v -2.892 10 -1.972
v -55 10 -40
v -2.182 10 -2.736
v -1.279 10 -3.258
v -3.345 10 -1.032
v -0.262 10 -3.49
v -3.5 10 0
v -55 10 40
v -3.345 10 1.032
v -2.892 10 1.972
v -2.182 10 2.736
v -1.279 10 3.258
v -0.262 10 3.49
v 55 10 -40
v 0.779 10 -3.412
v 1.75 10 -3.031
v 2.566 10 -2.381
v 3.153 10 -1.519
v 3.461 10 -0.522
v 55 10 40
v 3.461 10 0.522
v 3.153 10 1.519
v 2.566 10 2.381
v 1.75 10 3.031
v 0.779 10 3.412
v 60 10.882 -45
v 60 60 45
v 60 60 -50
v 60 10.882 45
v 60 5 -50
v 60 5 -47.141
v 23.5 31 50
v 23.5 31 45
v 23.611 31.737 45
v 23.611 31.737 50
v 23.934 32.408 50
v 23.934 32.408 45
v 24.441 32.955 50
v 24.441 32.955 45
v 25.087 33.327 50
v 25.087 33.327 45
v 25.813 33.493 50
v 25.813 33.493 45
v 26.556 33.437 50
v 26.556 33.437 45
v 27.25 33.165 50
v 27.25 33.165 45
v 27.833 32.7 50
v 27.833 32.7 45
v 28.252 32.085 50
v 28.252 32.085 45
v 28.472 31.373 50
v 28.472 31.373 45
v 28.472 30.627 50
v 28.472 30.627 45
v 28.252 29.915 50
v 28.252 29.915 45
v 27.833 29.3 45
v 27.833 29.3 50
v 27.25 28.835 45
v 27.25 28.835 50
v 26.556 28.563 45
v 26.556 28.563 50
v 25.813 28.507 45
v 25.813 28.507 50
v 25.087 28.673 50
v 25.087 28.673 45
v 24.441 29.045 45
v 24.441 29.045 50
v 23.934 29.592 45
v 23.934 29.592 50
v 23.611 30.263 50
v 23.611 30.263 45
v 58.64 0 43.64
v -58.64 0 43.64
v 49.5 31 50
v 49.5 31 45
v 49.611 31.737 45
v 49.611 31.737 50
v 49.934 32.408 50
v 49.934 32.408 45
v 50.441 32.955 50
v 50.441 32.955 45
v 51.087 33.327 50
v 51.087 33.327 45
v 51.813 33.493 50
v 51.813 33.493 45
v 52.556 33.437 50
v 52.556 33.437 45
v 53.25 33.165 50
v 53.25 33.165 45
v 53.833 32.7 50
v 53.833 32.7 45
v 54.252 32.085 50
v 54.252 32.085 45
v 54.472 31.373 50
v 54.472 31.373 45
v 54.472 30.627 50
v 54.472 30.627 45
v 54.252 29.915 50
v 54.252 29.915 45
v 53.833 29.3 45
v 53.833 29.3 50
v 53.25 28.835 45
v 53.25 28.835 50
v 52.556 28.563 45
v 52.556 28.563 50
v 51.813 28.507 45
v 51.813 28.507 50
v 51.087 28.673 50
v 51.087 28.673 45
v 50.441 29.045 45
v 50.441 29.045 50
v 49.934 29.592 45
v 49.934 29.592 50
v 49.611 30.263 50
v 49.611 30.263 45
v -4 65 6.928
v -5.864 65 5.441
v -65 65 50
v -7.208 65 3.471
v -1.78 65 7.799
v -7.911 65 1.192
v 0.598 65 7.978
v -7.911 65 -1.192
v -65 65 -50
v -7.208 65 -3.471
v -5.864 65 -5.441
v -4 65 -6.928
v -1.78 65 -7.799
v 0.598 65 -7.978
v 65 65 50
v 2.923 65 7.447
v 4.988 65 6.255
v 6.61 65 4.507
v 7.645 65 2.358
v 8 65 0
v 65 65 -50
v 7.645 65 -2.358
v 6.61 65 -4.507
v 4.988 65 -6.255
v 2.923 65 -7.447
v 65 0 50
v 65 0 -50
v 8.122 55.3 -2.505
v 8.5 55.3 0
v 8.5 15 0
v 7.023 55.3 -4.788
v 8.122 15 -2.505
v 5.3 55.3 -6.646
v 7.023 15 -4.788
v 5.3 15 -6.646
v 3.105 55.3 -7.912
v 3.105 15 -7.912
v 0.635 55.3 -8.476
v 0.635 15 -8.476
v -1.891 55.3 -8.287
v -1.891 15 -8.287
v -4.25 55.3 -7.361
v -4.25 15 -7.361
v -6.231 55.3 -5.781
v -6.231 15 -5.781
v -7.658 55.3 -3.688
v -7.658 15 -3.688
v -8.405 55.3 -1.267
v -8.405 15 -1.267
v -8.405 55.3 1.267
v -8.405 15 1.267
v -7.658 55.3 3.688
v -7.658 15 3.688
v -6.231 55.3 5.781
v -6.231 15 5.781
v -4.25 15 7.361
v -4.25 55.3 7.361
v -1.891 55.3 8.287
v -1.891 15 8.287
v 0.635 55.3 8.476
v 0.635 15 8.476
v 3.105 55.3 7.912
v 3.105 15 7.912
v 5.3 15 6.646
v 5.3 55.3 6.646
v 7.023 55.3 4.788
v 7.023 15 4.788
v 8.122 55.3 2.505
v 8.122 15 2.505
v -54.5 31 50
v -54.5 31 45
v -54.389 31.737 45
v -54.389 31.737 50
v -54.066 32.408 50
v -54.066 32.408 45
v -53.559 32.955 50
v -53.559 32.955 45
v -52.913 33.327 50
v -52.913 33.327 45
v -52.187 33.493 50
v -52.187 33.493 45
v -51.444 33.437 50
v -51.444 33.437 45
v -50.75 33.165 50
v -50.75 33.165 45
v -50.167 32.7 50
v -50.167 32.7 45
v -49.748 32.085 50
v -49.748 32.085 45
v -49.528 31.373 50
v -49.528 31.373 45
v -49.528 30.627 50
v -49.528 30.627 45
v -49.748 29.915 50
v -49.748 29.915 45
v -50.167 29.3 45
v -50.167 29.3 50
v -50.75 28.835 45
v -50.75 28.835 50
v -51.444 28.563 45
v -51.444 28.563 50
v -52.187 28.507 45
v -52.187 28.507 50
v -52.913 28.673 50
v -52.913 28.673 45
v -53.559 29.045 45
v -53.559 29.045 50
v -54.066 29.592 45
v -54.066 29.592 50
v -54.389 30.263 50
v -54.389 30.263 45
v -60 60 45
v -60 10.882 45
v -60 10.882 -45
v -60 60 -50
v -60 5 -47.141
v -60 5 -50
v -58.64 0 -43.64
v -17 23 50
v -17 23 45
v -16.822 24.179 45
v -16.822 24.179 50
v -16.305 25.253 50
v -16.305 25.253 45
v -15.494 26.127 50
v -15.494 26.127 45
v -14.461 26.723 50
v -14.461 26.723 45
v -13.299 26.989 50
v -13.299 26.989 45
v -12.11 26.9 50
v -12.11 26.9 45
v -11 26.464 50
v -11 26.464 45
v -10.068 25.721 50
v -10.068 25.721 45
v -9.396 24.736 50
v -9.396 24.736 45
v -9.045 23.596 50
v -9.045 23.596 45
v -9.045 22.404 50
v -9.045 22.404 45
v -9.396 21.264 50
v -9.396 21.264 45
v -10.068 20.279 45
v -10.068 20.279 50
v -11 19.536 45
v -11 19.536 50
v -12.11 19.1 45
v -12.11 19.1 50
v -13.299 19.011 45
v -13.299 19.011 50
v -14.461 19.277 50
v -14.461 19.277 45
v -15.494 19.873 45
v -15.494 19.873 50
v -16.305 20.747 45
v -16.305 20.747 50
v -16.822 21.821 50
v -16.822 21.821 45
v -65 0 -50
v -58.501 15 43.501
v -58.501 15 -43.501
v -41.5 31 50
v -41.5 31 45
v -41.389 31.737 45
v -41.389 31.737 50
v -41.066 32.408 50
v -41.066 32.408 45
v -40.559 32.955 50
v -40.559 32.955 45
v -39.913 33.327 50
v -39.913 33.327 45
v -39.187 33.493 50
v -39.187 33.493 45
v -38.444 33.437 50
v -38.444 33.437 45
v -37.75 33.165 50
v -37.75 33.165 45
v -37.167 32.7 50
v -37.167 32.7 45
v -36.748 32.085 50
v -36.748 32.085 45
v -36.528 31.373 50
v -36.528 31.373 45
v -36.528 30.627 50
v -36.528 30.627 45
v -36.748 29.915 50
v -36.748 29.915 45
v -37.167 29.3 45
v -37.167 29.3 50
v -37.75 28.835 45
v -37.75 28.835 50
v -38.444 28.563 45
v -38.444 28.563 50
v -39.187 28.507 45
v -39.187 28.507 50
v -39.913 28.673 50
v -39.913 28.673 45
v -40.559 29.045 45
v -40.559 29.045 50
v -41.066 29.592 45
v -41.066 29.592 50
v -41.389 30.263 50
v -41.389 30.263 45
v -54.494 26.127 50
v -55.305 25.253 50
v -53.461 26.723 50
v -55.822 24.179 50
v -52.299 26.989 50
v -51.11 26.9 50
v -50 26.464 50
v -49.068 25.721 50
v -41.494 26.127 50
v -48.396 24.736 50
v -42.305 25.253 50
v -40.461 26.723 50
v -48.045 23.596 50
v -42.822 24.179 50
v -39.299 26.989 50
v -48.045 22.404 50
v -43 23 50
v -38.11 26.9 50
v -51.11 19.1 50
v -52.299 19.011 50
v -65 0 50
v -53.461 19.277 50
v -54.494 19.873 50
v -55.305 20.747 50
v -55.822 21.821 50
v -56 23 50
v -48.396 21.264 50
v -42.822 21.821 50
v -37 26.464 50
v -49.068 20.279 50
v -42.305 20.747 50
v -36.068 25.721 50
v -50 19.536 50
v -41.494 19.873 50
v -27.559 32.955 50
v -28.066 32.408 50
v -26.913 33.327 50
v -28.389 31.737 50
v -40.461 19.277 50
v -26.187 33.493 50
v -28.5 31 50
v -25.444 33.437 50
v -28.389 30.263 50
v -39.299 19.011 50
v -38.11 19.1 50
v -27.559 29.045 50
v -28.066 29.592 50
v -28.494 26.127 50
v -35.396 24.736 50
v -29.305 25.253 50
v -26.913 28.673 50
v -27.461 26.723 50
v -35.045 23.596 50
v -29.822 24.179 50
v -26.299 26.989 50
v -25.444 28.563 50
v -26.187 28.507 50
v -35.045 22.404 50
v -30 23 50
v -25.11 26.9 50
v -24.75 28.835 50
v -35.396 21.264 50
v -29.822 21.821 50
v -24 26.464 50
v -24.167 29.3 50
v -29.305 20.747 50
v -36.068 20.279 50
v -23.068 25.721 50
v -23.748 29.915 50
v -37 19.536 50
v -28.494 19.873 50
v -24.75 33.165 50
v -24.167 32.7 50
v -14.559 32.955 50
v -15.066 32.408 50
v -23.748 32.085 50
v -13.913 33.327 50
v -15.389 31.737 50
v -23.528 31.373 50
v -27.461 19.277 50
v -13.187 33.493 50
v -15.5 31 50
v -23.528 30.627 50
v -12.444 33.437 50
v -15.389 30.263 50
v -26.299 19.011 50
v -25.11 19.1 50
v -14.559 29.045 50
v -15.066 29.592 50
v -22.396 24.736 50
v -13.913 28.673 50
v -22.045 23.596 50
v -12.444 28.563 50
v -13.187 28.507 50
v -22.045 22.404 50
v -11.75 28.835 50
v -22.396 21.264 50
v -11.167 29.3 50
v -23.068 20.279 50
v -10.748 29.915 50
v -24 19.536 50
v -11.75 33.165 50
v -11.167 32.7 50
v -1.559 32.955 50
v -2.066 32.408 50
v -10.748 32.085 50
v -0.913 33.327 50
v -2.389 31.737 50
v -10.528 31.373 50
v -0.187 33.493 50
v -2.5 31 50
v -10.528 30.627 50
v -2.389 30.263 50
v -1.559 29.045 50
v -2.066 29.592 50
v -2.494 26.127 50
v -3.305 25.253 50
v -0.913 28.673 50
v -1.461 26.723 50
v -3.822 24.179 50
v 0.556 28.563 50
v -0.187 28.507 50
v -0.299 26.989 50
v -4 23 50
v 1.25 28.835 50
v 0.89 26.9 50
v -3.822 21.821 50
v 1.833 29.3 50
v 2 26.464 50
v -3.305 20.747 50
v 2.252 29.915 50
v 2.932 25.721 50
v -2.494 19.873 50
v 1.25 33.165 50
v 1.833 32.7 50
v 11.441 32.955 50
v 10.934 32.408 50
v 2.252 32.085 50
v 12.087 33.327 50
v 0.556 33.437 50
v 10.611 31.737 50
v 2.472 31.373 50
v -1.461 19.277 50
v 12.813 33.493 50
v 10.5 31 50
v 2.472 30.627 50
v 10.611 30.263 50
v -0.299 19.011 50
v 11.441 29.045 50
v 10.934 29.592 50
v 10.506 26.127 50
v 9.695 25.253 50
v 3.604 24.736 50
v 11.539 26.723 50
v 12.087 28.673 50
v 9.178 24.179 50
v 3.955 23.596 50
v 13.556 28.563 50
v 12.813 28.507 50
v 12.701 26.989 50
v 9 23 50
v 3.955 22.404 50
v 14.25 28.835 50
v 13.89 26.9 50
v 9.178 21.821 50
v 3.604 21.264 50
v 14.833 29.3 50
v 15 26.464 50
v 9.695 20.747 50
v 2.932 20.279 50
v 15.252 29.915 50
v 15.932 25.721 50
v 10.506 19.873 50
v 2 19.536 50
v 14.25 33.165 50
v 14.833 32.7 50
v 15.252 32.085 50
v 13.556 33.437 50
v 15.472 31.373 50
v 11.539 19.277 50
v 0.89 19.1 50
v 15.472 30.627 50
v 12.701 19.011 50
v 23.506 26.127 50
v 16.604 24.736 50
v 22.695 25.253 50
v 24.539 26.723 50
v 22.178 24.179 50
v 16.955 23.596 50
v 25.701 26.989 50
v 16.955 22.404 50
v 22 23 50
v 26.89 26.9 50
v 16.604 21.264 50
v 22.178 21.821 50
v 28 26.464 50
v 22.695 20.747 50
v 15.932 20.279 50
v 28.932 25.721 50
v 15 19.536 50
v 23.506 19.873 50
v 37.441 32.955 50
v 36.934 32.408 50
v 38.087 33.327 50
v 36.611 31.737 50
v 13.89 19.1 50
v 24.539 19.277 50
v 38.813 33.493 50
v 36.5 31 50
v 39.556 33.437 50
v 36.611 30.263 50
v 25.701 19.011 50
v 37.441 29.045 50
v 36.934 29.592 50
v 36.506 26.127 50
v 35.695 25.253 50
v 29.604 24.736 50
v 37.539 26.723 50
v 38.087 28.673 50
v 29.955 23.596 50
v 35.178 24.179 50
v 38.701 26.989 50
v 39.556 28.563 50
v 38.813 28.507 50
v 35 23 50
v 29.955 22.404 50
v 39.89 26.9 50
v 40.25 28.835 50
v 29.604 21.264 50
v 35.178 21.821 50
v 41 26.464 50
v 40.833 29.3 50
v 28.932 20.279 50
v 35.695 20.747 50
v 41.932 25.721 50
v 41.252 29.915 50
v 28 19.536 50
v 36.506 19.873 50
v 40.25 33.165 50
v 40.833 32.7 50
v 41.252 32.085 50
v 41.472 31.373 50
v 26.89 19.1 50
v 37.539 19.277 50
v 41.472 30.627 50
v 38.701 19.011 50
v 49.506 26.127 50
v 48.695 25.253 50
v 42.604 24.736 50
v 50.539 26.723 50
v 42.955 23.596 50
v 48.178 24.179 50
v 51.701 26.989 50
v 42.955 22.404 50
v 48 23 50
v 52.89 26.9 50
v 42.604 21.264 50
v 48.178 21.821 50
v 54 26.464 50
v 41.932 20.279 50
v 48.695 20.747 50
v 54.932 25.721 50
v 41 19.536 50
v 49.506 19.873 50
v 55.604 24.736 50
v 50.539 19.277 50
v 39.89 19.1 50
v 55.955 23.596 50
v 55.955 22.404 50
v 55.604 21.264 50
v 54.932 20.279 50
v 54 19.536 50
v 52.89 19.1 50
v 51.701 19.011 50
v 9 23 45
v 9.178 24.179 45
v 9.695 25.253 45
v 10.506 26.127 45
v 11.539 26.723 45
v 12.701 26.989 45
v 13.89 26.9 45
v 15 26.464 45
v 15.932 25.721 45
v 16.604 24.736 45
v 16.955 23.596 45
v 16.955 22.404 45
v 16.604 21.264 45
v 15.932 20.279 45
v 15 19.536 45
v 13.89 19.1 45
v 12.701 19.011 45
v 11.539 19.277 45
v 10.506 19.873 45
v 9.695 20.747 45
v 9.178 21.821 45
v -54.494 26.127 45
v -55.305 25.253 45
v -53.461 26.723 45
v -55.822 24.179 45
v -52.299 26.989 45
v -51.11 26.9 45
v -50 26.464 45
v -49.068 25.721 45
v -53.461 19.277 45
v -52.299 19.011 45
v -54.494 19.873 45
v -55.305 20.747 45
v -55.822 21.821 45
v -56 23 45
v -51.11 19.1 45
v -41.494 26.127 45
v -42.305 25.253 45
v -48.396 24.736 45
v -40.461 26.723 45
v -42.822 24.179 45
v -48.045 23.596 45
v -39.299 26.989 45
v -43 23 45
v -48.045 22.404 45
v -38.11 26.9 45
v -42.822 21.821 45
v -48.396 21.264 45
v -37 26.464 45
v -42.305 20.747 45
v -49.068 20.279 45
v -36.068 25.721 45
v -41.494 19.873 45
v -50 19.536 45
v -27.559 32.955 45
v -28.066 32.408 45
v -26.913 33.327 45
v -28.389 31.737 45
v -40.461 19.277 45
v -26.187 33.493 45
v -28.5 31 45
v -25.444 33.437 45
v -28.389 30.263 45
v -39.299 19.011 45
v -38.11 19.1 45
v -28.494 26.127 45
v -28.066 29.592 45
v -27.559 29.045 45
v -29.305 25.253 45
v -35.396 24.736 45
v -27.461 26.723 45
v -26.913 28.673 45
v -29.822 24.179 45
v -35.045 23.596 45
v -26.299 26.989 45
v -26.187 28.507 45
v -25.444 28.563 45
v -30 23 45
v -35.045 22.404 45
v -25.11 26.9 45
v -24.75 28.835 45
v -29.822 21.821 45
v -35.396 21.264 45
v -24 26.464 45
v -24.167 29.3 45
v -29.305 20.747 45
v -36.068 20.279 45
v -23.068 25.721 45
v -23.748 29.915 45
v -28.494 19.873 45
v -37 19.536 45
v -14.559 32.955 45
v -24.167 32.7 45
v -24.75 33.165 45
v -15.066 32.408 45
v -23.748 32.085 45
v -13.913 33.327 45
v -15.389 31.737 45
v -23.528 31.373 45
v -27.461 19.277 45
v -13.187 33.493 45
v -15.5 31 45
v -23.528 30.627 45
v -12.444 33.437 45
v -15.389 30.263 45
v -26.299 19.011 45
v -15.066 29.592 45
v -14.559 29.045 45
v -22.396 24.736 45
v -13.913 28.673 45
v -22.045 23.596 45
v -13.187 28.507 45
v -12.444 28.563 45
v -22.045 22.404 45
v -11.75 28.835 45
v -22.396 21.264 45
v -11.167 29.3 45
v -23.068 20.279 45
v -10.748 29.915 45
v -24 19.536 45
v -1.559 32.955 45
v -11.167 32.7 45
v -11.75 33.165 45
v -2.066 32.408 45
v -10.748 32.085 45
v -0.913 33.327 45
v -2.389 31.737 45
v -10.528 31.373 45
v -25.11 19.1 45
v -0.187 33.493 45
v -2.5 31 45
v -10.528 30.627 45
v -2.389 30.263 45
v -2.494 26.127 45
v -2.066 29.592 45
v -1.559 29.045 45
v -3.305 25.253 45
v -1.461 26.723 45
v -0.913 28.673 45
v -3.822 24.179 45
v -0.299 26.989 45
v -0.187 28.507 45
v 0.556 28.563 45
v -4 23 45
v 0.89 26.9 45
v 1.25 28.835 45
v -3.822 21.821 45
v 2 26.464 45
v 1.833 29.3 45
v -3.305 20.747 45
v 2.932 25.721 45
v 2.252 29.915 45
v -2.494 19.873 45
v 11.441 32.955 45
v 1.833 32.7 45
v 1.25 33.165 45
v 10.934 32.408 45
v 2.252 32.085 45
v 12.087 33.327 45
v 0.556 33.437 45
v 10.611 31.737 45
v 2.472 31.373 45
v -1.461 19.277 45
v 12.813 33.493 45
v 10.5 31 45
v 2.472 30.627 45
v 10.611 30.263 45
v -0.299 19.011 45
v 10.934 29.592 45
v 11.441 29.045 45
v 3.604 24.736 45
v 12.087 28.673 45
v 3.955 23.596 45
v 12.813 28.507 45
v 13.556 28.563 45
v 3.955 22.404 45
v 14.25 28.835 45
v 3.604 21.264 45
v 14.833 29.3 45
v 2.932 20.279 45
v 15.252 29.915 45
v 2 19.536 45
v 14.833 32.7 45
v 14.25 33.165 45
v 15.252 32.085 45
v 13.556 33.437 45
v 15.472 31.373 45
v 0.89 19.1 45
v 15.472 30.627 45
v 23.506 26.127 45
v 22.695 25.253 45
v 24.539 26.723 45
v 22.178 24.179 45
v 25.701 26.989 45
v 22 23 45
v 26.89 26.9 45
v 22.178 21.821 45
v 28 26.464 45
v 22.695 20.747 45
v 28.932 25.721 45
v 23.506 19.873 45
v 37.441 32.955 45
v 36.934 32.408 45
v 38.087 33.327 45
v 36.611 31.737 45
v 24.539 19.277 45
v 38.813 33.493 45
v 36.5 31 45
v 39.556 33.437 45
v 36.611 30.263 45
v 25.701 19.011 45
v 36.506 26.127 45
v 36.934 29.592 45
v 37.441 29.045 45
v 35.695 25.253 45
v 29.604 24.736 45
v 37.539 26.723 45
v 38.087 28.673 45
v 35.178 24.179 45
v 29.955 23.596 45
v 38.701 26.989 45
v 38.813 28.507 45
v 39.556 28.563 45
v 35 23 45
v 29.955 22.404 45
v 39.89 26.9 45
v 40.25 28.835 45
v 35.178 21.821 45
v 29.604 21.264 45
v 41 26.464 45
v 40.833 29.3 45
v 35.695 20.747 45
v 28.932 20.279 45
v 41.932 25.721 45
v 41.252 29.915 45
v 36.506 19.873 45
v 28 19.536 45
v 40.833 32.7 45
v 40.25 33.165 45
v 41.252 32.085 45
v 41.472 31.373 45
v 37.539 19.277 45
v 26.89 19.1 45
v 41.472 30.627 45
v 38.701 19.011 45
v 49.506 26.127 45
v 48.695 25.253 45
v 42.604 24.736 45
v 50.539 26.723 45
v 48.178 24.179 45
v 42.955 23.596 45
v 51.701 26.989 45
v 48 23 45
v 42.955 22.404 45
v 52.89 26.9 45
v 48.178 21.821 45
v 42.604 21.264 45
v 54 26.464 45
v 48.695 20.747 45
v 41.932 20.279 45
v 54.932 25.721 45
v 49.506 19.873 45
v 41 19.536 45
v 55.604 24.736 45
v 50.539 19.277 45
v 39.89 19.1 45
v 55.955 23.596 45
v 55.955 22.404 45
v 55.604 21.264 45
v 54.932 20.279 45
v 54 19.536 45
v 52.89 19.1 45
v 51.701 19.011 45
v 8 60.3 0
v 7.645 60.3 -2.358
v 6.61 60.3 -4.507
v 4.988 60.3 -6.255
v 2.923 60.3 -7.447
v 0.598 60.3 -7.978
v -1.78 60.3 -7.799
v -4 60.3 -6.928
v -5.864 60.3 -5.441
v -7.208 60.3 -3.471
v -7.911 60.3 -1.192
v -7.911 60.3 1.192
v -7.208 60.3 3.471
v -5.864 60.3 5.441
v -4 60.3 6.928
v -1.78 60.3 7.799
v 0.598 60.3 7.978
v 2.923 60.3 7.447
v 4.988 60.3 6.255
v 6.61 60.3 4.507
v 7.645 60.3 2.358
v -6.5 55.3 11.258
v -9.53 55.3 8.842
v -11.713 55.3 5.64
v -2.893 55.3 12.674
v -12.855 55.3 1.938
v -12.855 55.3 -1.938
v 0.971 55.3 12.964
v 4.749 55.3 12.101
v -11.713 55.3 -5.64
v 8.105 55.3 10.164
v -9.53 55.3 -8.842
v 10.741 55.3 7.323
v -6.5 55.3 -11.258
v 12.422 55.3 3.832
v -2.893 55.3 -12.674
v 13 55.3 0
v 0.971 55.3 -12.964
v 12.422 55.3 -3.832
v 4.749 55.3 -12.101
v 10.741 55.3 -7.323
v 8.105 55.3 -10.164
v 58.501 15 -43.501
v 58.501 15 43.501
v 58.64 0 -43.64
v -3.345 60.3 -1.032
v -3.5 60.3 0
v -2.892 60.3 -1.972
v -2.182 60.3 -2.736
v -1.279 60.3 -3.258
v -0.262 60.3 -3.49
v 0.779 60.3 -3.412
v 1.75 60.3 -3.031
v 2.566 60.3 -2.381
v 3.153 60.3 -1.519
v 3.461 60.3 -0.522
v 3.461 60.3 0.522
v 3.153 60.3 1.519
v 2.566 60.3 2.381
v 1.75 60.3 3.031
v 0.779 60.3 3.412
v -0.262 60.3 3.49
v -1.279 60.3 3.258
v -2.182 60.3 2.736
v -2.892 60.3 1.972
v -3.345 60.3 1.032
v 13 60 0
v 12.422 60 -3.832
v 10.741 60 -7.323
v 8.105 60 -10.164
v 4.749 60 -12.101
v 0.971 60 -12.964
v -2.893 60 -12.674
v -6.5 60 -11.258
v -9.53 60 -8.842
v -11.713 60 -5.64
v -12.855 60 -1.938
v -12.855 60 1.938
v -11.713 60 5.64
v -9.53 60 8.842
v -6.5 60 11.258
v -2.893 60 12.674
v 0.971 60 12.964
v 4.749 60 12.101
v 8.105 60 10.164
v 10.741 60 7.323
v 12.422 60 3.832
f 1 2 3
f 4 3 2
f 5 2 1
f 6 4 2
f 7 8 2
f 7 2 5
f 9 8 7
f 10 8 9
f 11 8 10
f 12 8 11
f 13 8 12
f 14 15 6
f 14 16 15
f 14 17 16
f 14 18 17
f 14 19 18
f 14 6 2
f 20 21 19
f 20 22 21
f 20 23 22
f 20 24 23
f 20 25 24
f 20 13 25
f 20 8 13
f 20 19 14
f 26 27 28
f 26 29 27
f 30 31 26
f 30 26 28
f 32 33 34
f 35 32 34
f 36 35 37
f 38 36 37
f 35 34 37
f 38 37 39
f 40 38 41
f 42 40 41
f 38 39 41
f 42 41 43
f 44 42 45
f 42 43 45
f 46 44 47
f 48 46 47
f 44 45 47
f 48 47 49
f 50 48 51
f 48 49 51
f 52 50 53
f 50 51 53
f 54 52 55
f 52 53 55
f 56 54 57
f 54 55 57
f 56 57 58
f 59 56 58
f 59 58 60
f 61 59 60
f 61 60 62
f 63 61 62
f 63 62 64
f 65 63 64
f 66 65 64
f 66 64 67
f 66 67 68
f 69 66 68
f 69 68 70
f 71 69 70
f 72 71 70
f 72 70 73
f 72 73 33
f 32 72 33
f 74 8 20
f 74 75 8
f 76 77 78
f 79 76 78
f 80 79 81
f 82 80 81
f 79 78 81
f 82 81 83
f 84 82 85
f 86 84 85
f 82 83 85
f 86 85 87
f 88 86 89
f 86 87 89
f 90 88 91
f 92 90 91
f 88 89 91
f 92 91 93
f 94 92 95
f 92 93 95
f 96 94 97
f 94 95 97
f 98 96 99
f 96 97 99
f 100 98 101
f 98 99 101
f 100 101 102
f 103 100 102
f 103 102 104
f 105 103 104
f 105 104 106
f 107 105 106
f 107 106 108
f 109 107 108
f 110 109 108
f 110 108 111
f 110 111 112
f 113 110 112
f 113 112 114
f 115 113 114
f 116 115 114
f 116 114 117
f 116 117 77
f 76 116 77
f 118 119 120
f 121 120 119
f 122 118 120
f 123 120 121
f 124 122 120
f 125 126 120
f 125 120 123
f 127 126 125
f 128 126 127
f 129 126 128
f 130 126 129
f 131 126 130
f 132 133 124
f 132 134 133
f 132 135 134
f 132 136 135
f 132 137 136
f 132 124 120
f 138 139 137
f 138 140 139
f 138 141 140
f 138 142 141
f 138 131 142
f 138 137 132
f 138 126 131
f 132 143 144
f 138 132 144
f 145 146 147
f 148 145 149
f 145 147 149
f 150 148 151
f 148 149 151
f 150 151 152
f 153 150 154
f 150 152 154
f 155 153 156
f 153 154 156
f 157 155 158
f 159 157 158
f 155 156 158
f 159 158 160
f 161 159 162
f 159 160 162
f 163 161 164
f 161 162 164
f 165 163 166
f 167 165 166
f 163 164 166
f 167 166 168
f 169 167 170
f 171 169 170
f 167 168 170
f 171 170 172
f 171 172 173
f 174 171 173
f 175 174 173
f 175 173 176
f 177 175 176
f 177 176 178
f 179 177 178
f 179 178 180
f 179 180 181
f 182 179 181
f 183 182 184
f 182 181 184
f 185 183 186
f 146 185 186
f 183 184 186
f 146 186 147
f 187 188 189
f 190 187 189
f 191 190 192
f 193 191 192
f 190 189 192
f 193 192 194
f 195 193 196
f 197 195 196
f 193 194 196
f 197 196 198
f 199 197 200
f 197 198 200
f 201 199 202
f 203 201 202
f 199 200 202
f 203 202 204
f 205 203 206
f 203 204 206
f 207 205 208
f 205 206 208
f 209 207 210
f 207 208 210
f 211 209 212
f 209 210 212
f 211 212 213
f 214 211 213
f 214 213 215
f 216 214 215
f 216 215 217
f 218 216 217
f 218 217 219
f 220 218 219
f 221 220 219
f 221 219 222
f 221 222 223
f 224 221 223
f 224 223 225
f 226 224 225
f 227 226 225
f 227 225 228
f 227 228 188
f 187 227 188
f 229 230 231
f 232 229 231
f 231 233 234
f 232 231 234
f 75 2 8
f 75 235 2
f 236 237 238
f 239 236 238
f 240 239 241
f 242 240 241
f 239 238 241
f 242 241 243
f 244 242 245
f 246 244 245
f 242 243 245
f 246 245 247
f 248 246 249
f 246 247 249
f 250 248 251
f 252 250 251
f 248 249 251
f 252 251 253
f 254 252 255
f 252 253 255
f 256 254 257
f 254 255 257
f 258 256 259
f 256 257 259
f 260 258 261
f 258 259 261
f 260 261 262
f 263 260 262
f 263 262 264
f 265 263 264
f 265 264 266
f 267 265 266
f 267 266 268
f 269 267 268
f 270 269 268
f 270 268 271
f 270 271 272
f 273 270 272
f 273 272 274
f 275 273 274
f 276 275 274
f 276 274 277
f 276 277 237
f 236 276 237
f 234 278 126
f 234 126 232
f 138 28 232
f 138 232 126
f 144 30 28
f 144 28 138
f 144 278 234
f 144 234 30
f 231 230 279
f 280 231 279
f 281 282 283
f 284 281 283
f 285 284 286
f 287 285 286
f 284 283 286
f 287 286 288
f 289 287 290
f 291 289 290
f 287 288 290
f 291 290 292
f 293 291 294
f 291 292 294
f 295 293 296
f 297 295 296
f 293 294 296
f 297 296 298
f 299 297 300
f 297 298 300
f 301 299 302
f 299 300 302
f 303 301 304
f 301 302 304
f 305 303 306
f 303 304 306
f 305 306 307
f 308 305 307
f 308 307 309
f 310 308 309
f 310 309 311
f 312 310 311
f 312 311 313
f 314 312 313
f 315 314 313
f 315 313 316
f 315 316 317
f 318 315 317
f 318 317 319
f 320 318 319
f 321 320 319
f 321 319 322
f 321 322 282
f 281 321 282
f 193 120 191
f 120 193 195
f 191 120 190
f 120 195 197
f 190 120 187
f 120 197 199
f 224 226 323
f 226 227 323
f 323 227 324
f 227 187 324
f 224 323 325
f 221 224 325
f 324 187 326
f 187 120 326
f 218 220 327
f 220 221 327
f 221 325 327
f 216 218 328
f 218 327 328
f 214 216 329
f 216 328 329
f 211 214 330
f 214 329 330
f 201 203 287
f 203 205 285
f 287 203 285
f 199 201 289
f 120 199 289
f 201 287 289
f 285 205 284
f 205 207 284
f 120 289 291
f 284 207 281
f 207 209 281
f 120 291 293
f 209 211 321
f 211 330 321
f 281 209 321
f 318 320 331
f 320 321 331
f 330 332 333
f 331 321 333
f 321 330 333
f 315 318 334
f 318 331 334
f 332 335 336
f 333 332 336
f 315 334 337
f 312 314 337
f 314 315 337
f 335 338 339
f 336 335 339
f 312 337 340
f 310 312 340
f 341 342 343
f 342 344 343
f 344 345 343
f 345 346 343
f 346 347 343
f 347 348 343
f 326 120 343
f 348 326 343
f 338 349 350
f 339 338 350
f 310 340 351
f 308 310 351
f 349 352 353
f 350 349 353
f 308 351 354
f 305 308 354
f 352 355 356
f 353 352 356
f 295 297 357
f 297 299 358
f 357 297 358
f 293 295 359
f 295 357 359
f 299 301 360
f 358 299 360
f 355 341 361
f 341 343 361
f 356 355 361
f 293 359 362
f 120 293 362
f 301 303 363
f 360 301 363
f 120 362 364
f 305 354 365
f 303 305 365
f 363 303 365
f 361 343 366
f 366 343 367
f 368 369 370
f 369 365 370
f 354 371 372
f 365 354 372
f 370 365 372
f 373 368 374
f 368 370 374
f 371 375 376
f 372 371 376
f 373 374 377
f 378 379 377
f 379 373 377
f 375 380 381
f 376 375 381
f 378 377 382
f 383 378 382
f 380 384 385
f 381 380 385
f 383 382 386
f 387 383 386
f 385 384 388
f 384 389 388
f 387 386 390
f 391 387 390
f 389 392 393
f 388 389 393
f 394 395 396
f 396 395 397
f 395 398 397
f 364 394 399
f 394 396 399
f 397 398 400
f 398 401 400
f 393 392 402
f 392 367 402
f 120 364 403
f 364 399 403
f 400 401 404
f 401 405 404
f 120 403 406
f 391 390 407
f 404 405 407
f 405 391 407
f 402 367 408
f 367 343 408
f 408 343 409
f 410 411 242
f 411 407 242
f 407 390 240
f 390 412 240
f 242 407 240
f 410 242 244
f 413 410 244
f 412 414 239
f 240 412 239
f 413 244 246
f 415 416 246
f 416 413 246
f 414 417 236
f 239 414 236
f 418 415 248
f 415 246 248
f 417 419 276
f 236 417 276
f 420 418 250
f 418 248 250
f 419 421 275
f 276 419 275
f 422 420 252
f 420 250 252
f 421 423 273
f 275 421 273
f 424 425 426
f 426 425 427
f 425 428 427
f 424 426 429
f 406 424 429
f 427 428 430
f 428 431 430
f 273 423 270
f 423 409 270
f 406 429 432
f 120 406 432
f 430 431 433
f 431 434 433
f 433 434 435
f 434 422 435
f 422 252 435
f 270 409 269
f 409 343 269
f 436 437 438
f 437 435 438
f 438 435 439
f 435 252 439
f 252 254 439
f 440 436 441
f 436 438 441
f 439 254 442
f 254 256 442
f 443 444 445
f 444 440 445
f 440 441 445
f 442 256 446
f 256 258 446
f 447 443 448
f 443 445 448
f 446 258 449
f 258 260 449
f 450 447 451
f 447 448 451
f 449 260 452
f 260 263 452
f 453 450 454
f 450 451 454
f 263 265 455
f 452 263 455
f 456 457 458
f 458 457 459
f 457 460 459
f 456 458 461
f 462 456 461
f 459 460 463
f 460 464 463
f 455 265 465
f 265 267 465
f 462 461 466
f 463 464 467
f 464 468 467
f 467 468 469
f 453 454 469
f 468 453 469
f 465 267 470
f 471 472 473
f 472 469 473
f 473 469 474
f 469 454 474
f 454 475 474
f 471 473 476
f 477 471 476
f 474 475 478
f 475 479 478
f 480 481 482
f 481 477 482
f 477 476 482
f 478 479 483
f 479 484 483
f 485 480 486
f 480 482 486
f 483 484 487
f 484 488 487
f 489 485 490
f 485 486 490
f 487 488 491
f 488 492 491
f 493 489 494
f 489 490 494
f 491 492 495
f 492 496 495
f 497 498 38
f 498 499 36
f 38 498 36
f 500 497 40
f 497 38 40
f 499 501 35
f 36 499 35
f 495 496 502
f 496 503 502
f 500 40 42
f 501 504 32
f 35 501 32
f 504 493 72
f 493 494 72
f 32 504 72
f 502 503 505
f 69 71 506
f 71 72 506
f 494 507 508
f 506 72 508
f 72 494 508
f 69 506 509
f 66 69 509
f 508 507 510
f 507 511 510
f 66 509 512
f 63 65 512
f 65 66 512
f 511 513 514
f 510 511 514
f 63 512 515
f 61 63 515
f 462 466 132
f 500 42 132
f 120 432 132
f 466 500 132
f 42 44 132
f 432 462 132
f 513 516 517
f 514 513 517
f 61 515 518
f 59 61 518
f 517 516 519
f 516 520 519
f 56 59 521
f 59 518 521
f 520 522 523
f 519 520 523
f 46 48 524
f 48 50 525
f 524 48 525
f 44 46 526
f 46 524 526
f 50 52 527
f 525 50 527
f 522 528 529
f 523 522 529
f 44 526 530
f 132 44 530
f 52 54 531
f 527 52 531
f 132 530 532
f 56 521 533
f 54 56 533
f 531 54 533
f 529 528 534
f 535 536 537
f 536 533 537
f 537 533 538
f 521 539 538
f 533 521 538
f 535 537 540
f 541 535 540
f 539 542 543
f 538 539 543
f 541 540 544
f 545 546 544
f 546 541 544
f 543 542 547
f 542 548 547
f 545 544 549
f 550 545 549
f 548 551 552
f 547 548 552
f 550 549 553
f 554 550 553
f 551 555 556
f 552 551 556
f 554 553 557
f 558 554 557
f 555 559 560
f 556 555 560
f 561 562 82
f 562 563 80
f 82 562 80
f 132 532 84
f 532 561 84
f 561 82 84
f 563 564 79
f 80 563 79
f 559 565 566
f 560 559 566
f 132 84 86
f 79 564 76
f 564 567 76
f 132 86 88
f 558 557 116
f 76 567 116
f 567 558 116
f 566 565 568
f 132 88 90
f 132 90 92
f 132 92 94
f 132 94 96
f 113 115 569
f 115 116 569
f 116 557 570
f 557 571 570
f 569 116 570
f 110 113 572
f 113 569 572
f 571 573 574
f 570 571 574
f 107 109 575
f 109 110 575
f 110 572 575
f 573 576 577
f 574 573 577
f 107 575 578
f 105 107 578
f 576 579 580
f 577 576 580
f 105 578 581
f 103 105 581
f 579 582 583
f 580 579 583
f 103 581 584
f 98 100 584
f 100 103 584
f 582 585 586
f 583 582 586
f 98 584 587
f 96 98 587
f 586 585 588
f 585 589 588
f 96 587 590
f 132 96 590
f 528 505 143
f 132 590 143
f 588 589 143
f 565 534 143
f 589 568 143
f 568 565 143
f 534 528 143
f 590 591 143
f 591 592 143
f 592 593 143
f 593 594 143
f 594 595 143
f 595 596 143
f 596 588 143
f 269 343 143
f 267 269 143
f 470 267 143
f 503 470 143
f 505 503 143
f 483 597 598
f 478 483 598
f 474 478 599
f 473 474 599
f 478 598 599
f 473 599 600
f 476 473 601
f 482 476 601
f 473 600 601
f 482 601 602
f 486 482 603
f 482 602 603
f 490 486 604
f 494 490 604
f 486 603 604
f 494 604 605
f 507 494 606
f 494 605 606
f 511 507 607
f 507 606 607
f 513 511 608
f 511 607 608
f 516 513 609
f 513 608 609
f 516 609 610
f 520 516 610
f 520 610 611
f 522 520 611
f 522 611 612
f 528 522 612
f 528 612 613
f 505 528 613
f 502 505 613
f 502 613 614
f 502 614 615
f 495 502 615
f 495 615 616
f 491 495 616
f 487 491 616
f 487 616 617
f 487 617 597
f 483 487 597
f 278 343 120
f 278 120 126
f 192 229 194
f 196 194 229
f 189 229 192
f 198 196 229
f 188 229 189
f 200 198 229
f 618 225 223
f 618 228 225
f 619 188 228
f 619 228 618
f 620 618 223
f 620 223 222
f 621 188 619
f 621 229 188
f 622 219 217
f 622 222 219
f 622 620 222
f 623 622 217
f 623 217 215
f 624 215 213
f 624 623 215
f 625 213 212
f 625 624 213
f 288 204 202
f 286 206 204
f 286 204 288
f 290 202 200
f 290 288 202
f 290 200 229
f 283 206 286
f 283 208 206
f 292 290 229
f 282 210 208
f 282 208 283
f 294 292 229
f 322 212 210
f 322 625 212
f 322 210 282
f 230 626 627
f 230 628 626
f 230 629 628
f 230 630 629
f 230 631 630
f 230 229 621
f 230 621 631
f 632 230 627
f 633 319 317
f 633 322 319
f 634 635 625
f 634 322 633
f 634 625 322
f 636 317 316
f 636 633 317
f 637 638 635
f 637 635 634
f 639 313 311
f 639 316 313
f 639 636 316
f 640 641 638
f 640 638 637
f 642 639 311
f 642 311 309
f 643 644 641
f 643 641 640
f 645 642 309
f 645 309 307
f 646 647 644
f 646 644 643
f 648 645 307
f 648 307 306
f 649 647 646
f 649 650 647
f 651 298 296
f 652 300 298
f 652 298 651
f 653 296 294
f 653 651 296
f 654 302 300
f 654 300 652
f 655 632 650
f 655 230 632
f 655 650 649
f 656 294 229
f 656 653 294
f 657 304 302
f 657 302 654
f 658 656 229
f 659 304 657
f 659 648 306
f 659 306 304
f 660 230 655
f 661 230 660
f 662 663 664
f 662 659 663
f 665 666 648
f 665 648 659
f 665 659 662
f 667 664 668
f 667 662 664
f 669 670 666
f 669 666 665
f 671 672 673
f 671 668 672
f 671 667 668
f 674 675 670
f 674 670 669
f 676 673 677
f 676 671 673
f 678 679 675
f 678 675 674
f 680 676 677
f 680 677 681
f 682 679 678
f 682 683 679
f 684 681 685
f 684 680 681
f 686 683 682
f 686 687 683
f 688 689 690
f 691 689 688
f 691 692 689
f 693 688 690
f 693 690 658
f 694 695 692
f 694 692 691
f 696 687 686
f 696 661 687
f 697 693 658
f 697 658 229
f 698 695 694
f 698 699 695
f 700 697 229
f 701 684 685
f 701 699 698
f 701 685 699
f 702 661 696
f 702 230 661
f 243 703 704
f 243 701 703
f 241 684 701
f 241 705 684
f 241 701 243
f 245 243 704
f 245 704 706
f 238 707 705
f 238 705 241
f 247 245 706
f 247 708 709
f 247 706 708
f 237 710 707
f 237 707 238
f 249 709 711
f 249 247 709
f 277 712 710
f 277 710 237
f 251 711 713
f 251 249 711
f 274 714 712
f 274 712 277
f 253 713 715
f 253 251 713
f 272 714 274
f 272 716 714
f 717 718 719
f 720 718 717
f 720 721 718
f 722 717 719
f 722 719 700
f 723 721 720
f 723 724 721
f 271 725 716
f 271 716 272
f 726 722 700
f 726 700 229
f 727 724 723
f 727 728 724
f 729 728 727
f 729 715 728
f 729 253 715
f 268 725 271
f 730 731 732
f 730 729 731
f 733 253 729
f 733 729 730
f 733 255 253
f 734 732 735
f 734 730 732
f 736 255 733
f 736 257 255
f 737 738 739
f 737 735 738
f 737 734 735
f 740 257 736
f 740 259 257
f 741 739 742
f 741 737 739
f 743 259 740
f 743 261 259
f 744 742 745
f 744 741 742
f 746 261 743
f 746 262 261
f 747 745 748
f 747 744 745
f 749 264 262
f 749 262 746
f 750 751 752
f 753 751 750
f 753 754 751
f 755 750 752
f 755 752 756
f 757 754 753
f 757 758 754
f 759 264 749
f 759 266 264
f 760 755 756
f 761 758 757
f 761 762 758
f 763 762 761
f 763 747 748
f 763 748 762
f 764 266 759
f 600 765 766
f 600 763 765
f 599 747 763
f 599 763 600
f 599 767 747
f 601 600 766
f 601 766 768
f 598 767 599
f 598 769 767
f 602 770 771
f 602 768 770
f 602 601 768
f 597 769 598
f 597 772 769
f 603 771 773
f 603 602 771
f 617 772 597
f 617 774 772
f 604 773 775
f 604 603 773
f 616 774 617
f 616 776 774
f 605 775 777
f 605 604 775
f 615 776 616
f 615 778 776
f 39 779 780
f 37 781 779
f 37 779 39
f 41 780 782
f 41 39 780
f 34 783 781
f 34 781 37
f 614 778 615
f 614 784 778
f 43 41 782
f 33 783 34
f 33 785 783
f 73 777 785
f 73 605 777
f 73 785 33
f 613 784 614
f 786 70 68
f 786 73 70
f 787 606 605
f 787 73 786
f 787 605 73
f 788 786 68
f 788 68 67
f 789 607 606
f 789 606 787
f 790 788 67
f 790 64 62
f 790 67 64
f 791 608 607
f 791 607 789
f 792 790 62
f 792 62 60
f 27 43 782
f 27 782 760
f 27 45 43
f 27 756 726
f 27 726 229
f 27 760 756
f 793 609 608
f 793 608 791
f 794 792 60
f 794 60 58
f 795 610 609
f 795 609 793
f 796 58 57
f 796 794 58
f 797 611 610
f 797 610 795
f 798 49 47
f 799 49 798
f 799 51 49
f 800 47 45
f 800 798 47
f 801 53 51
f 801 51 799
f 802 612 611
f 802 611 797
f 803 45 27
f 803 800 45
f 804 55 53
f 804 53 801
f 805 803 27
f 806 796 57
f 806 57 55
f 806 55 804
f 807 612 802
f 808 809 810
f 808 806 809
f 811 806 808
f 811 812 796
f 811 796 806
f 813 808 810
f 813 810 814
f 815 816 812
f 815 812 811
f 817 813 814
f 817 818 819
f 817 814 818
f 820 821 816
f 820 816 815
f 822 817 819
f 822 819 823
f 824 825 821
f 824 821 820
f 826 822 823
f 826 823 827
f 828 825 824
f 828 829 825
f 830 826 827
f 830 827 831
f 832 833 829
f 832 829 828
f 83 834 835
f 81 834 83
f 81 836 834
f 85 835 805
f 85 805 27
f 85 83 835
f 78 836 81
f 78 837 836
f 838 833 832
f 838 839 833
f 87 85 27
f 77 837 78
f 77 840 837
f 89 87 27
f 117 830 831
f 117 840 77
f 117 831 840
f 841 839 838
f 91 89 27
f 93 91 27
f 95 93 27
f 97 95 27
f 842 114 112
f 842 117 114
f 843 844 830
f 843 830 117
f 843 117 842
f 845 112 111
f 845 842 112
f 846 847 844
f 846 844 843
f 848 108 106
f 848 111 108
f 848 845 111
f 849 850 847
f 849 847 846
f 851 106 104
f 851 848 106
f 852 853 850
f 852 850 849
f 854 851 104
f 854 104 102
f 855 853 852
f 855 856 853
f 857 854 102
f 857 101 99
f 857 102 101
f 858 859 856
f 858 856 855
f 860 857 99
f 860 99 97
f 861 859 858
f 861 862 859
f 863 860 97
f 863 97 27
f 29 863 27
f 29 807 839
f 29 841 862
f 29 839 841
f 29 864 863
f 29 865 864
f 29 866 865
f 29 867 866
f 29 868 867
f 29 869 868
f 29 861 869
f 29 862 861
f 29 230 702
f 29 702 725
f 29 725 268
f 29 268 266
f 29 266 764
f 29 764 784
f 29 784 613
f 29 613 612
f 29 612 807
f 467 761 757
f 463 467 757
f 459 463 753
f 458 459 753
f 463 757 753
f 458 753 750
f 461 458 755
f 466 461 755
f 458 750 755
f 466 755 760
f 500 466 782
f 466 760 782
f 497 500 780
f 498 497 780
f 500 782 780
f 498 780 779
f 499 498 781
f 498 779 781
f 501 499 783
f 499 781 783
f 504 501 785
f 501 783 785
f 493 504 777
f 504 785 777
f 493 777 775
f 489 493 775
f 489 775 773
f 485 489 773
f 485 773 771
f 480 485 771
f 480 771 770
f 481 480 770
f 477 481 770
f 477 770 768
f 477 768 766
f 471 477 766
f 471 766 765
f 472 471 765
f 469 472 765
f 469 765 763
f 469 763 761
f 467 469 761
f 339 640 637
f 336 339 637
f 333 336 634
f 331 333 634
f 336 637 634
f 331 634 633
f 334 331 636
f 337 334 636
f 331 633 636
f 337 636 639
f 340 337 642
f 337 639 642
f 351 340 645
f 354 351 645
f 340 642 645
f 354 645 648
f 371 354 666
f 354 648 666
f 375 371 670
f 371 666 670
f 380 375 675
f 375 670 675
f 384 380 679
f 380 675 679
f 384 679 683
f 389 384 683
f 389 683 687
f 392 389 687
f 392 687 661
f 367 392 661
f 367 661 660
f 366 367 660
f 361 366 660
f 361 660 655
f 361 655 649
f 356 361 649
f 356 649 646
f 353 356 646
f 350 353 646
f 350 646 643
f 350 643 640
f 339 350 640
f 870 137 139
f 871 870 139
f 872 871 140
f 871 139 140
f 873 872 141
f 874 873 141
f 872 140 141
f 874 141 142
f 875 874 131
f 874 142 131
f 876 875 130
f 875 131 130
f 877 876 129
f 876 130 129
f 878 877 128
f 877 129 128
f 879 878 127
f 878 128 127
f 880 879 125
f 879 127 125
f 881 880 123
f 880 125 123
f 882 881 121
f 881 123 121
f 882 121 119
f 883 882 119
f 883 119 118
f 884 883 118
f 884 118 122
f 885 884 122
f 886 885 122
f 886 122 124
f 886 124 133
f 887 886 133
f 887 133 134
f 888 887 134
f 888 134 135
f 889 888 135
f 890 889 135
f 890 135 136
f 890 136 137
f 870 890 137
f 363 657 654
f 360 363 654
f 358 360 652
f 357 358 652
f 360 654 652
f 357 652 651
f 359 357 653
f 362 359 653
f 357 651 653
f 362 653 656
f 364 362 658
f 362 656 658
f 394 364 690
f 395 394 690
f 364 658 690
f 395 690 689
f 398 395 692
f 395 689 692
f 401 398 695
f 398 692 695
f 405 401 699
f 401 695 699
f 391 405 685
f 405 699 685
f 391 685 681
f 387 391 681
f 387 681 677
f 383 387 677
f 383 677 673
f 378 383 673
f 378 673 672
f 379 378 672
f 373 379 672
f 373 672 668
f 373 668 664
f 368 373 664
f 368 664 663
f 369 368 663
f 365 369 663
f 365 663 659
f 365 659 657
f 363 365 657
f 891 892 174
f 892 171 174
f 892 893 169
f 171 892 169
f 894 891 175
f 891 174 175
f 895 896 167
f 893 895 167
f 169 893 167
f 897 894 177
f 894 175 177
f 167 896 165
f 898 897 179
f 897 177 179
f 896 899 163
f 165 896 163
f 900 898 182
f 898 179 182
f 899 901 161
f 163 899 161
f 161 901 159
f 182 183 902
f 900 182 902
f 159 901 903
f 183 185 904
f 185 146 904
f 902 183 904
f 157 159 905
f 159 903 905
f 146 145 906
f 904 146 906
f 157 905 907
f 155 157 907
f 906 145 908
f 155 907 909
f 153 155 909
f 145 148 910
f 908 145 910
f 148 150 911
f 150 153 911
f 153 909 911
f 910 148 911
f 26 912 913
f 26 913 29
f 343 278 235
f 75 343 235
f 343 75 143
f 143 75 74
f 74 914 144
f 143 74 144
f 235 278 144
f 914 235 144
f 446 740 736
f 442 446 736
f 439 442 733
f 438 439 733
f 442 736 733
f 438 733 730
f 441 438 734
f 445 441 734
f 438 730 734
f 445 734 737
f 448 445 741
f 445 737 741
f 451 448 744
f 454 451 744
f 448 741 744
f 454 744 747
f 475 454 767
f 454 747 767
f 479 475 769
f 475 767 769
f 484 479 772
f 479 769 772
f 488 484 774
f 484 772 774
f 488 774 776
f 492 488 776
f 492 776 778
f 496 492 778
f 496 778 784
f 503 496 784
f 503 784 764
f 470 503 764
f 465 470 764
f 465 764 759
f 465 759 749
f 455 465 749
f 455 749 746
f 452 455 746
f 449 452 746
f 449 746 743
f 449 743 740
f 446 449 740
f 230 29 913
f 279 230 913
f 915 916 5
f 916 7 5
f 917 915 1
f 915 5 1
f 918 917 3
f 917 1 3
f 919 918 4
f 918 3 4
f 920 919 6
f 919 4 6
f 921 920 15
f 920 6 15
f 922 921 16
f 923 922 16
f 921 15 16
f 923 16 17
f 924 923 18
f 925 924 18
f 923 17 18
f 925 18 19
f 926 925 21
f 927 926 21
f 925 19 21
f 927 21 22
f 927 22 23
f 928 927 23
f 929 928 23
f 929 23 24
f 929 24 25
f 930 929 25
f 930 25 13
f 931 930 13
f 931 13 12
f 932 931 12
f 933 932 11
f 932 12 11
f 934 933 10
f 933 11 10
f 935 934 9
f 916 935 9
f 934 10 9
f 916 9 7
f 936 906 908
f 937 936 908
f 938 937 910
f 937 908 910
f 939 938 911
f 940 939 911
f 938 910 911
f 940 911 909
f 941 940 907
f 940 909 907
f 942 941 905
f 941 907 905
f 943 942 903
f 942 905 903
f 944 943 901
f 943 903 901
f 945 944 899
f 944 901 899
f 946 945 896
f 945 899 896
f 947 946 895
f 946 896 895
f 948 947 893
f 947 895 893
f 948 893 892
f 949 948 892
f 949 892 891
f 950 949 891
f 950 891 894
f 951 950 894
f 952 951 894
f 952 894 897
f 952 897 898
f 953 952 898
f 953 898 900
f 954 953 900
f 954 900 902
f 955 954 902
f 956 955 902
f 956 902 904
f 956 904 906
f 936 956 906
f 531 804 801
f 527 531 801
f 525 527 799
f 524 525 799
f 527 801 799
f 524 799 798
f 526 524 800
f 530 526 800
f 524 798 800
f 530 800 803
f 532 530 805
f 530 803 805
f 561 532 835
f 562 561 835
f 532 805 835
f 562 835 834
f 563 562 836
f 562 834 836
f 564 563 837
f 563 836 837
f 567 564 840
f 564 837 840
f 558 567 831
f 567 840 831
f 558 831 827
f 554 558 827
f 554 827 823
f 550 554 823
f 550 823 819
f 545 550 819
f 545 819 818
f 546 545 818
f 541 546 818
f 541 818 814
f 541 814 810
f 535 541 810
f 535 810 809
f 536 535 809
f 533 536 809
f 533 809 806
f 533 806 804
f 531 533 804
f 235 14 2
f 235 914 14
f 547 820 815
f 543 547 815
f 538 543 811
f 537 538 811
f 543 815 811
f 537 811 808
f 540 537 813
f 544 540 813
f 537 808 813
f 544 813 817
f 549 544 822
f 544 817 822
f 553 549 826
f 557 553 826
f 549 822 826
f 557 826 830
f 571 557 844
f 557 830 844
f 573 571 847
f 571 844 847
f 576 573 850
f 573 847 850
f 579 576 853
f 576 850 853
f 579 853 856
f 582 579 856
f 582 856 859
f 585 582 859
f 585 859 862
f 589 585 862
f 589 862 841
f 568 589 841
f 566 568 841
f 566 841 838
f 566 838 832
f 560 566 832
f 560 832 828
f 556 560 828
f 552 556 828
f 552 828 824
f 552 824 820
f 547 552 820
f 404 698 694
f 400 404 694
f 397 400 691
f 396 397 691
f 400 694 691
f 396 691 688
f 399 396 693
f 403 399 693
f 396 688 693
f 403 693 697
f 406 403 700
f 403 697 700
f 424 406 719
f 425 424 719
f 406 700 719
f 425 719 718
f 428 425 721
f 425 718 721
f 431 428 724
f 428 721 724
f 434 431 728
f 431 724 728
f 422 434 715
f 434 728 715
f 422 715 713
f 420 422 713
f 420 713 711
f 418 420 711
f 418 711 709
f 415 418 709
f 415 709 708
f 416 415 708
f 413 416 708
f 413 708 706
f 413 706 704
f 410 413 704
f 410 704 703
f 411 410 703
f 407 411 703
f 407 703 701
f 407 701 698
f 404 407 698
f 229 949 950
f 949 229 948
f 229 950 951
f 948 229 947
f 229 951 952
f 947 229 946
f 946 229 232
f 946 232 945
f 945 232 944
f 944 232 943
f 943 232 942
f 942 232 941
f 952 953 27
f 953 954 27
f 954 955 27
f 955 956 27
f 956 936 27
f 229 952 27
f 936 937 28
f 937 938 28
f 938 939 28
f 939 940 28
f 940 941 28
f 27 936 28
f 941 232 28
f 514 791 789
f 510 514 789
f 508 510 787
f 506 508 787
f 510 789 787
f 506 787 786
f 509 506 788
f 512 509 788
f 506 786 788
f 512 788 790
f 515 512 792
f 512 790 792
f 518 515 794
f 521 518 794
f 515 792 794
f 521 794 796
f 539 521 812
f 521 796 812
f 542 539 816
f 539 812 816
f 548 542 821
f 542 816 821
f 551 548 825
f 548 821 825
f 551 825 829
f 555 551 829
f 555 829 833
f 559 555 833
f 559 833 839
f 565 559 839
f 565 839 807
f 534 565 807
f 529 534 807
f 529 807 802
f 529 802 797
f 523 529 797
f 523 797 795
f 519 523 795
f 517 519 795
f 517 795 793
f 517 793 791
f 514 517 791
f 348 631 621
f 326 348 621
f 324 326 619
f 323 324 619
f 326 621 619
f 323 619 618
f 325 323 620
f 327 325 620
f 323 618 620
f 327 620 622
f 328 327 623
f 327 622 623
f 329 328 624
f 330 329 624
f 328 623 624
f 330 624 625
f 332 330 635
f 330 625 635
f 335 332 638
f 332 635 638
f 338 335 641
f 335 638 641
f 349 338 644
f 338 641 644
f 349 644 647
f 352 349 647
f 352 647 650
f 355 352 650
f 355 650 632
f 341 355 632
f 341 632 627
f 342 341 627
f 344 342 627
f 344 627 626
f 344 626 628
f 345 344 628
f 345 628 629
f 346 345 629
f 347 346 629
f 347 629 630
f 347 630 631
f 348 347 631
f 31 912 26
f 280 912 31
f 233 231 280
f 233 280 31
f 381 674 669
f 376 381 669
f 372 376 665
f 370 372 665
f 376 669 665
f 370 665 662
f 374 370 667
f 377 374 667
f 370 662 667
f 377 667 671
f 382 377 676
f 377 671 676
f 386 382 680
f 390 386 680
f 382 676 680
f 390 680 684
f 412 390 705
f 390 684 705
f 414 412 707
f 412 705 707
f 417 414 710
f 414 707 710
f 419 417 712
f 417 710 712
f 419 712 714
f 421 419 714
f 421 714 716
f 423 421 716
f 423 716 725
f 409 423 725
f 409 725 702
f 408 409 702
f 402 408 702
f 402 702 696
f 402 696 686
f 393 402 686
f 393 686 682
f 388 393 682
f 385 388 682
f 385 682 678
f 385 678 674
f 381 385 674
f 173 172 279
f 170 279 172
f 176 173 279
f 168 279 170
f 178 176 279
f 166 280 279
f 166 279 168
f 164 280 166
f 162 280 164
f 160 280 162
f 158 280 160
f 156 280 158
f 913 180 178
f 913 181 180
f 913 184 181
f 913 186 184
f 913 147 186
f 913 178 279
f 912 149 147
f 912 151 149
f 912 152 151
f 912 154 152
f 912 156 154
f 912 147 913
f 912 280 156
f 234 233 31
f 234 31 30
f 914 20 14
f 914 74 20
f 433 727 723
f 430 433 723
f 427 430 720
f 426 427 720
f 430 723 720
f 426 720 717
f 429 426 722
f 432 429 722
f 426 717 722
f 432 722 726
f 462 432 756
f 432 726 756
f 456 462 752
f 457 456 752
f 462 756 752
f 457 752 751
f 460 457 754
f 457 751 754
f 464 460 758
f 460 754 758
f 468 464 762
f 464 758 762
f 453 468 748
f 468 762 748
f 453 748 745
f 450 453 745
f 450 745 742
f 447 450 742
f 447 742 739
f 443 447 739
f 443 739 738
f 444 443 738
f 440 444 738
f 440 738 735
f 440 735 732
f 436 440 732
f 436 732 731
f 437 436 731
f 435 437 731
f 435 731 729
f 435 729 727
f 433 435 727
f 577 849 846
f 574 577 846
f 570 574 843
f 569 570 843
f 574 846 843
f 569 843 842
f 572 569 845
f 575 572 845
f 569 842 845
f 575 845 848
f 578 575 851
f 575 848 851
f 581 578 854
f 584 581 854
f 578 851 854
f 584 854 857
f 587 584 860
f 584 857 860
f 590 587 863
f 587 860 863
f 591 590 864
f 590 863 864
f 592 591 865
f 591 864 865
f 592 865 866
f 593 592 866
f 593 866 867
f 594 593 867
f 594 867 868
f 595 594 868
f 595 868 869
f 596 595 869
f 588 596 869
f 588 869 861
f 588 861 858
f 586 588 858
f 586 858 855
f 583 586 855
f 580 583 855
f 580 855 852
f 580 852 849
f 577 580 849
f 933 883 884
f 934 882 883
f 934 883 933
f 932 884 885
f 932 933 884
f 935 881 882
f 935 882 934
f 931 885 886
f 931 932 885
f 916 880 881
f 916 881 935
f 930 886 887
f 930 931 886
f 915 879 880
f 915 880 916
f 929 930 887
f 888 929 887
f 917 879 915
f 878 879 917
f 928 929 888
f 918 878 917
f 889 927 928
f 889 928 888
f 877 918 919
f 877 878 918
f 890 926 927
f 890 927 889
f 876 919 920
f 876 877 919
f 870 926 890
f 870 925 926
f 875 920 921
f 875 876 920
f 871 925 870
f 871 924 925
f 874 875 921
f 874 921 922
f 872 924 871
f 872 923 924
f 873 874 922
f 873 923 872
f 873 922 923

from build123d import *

# Parameters (mm, degrees)
SKETCH1_W                                        = 130
SKETCH1_H                                        = 100
BOSS_EXTRUDE1_DEPTH                              = 65
SKETCH2_W                                        = 110
SKETCH2_H                                        = 80
CUT_EXTRUDE1_DEPTH                               = 10
CBORE_FOR_M6_HEX_HEAD_MACHINE_SCREW1_D           = 7
CBORE_FOR_M6_HEX_HEAD_MACHINE_SCREW1_CBORE_D     = 16
CBORE_FOR_M6_HEX_HEAD_MACHINE_SCREW1_CBORE_DEPTH = 4.7
SHELL1_START                                     = 15
SHELL1_OUTLINE_W                                 = 120
SHELL1_OUTLINE_H                                 = 95
SHELL1_OUTLINE_R                                 = 13
SHELL1_DEPTH                                     = 45
SHELL1_2_OUTLINE_R                               = 13
SHELL1_2_OUTLINE_R_2                             = 8.5
SHELL1_2_DEPTH                                   = 40.3
SHELL1_START_2                                   = -60
SHELL1_3_DEPTH                                   = 120
SHELL1_START_3                                   = -46
SHELL1_4_DEPTH                                   = 91
SKETCH6_R                                        = 4
SKETCH6_R_2                                      = 2.5
CUT_EXTRUDE2_DEPTH                               = 133.193040664


with BuildPart() as part:
    # Sketch1 → Boss-Extrude1 (new body)
    with BuildSketch(Plane(origin=(0, 0, 0), x_dir=(1, 0, 0), z_dir=(0, 1, 0))):
        Rectangle(SKETCH1_W, SKETCH1_H)
    extrude(amount=BOSS_EXTRUDE1_DEPTH)

    # Sketch2 → Cut-Extrude1 (cut)
    with BuildSketch(Plane.XZ):
        Rectangle(SKETCH2_W, SKETCH2_H)
    extrude(amount=-CUT_EXTRUDE1_DEPTH, mode=Mode.SUBTRACT)

    # Draft1: read off the stored shape, not the designer's step
    # Draft1: loft between two sections, ruled curve by curve
    draft1_from = [
        Edge.make_line((55, 10, -40), (-55, 10, -40)),
        Edge.make_line((-55, 10, -40), (-55, 10, 40)),
        Edge.make_line((-55, 10, 40), (55, 10, 40)),
        Edge.make_line((55, 10, 40), (55, 10, -40)),
    ]
    draft1_to = [
        Edge.make_line((58.639702343, 0, -43.639702343), (-58.639702343, 0, -43.639702343)),
        Edge.make_line((-58.639702343, 0, -43.639702343), (-58.639702343, 0, 43.639702343)),
        Edge.make_line((-58.639702343, 0, 43.639702343), (58.639702343, 0, 43.639702343)),
        Edge.make_line((58.639702343, 0, 43.639702343), (58.639702343, 0, -43.639702343)),
    ]
    draft1 = Solid(Shell([*[Face.make_surface_from_curves(draft1_from[k], draft1_to[k]) for k in range(4)], Face(Wire(draft1_from)), Face(Wire(draft1_to))]))
    add(draft1, mode=Mode.SUBTRACT)

    # CBORE for M6 Hex Head Machine Screw1 (through all)
    with Locations(Plane(origin=(0, 65, 0), x_dir=(1, 0, 0), z_dir=(0, 1, 0))):
        with Locations((0, 0)):
            CounterBoreHole(CBORE_FOR_M6_HEX_HEAD_MACHINE_SCREW1_D / 2, CBORE_FOR_M6_HEX_HEAD_MACHINE_SCREW1_CBORE_D / 2, CBORE_FOR_M6_HEX_HEAD_MACHINE_SCREW1_CBORE_DEPTH)

    # Shell1: read off the stored shape, not the designer's step
    # Shell1 outline → Shell1 (cut)
    with BuildSketch(Plane(origin=(0, 0, 0), x_dir=(1, 0, 0), z_dir=(0, 1, 0)).offset(SHELL1_START)):
        with Locations((0, 2.5)):
            Rectangle(SHELL1_OUTLINE_W, SHELL1_OUTLINE_H)
        Circle(SHELL1_OUTLINE_R, mode=Mode.SUBTRACT)
    extrude(amount=SHELL1_DEPTH, mode=Mode.SUBTRACT)

    # Shell1 2 outline → Shell1 2 (cut)
    with BuildSketch(Plane(origin=(0, 0, 0), x_dir=(1, 0, 0), z_dir=(0, 1, 0)).offset(SHELL1_START)):
        Circle(SHELL1_2_OUTLINE_R)
        Circle(SHELL1_2_OUTLINE_R_2, mode=Mode.SUBTRACT)
    extrude(amount=SHELL1_2_DEPTH, mode=Mode.SUBTRACT)

    # Shell1 3 outline → Shell1 3 (cut)
    with BuildSketch(Plane.YZ.offset(SHELL1_START_2)):
        Polygon((15, -43.501037691), (5, -47.140740034), (5, -50), (15, -50), align=None)
        Polygon((10.881634904, 45), (15, 43.501037691), (15, 45), align=None)
    extrude(amount=SHELL1_3_DEPTH, mode=Mode.SUBTRACT)

    # Shell1 4 outline → Shell1 4 (cut)
    with BuildSketch(Plane.XY.offset(SHELL1_START_3)):
        Polygon((-60, 15), (-60, 10.881634904), (-58.501037691, 15), align=None)
        Polygon((60, 15), (58.501037691, 15), (60, 10.881634904), align=None)
    extrude(amount=SHELL1_4_DEPTH, mode=Mode.SUBTRACT)

    # Sketch6 → Cut-Extrude2 (cut, through all)
    with BuildSketch(Plane(origin=(0, 0, 45), x_dir=(-1, 0, 0), z_dir=(0, 0, -1))):
        with Locations((-52, 23)):
            Circle(SKETCH6_R)
        with Locations((-52, 31)):
            Circle(SKETCH6_R_2)
        with Locations((-39, 31)):
            Circle(SKETCH6_R_2)
        with Locations((-39, 23)):
            Circle(SKETCH6_R)
        with Locations((-26, 31)):
            Circle(SKETCH6_R_2)
        with Locations((-26, 23)):
            Circle(SKETCH6_R)
        with Locations((-13, 31)):
            Circle(SKETCH6_R_2)
        with Locations((-13, 23)):
            Circle(SKETCH6_R)
        with Locations((0, 31)):
            Circle(SKETCH6_R_2)
        with Locations((0, 23)):
            Circle(SKETCH6_R)
        with Locations((13, 31)):
            Circle(SKETCH6_R_2)
        with Locations((13, 23)):
            Circle(SKETCH6_R)
        with Locations((26, 31)):
            Circle(SKETCH6_R_2)
        with Locations((26, 23)):
            Circle(SKETCH6_R)
        with Locations((39, 31)):
            Circle(SKETCH6_R_2)
        with Locations((39, 23)):
            Circle(SKETCH6_R)
        with Locations((52, 31)):
            Circle(SKETCH6_R_2)
        with Locations((52, 23)):
            Circle(SKETCH6_R)
    extrude(amount=-CUT_EXTRUDE2_DEPTH, mode=Mode.SUBTRACT)


solid = part.part
